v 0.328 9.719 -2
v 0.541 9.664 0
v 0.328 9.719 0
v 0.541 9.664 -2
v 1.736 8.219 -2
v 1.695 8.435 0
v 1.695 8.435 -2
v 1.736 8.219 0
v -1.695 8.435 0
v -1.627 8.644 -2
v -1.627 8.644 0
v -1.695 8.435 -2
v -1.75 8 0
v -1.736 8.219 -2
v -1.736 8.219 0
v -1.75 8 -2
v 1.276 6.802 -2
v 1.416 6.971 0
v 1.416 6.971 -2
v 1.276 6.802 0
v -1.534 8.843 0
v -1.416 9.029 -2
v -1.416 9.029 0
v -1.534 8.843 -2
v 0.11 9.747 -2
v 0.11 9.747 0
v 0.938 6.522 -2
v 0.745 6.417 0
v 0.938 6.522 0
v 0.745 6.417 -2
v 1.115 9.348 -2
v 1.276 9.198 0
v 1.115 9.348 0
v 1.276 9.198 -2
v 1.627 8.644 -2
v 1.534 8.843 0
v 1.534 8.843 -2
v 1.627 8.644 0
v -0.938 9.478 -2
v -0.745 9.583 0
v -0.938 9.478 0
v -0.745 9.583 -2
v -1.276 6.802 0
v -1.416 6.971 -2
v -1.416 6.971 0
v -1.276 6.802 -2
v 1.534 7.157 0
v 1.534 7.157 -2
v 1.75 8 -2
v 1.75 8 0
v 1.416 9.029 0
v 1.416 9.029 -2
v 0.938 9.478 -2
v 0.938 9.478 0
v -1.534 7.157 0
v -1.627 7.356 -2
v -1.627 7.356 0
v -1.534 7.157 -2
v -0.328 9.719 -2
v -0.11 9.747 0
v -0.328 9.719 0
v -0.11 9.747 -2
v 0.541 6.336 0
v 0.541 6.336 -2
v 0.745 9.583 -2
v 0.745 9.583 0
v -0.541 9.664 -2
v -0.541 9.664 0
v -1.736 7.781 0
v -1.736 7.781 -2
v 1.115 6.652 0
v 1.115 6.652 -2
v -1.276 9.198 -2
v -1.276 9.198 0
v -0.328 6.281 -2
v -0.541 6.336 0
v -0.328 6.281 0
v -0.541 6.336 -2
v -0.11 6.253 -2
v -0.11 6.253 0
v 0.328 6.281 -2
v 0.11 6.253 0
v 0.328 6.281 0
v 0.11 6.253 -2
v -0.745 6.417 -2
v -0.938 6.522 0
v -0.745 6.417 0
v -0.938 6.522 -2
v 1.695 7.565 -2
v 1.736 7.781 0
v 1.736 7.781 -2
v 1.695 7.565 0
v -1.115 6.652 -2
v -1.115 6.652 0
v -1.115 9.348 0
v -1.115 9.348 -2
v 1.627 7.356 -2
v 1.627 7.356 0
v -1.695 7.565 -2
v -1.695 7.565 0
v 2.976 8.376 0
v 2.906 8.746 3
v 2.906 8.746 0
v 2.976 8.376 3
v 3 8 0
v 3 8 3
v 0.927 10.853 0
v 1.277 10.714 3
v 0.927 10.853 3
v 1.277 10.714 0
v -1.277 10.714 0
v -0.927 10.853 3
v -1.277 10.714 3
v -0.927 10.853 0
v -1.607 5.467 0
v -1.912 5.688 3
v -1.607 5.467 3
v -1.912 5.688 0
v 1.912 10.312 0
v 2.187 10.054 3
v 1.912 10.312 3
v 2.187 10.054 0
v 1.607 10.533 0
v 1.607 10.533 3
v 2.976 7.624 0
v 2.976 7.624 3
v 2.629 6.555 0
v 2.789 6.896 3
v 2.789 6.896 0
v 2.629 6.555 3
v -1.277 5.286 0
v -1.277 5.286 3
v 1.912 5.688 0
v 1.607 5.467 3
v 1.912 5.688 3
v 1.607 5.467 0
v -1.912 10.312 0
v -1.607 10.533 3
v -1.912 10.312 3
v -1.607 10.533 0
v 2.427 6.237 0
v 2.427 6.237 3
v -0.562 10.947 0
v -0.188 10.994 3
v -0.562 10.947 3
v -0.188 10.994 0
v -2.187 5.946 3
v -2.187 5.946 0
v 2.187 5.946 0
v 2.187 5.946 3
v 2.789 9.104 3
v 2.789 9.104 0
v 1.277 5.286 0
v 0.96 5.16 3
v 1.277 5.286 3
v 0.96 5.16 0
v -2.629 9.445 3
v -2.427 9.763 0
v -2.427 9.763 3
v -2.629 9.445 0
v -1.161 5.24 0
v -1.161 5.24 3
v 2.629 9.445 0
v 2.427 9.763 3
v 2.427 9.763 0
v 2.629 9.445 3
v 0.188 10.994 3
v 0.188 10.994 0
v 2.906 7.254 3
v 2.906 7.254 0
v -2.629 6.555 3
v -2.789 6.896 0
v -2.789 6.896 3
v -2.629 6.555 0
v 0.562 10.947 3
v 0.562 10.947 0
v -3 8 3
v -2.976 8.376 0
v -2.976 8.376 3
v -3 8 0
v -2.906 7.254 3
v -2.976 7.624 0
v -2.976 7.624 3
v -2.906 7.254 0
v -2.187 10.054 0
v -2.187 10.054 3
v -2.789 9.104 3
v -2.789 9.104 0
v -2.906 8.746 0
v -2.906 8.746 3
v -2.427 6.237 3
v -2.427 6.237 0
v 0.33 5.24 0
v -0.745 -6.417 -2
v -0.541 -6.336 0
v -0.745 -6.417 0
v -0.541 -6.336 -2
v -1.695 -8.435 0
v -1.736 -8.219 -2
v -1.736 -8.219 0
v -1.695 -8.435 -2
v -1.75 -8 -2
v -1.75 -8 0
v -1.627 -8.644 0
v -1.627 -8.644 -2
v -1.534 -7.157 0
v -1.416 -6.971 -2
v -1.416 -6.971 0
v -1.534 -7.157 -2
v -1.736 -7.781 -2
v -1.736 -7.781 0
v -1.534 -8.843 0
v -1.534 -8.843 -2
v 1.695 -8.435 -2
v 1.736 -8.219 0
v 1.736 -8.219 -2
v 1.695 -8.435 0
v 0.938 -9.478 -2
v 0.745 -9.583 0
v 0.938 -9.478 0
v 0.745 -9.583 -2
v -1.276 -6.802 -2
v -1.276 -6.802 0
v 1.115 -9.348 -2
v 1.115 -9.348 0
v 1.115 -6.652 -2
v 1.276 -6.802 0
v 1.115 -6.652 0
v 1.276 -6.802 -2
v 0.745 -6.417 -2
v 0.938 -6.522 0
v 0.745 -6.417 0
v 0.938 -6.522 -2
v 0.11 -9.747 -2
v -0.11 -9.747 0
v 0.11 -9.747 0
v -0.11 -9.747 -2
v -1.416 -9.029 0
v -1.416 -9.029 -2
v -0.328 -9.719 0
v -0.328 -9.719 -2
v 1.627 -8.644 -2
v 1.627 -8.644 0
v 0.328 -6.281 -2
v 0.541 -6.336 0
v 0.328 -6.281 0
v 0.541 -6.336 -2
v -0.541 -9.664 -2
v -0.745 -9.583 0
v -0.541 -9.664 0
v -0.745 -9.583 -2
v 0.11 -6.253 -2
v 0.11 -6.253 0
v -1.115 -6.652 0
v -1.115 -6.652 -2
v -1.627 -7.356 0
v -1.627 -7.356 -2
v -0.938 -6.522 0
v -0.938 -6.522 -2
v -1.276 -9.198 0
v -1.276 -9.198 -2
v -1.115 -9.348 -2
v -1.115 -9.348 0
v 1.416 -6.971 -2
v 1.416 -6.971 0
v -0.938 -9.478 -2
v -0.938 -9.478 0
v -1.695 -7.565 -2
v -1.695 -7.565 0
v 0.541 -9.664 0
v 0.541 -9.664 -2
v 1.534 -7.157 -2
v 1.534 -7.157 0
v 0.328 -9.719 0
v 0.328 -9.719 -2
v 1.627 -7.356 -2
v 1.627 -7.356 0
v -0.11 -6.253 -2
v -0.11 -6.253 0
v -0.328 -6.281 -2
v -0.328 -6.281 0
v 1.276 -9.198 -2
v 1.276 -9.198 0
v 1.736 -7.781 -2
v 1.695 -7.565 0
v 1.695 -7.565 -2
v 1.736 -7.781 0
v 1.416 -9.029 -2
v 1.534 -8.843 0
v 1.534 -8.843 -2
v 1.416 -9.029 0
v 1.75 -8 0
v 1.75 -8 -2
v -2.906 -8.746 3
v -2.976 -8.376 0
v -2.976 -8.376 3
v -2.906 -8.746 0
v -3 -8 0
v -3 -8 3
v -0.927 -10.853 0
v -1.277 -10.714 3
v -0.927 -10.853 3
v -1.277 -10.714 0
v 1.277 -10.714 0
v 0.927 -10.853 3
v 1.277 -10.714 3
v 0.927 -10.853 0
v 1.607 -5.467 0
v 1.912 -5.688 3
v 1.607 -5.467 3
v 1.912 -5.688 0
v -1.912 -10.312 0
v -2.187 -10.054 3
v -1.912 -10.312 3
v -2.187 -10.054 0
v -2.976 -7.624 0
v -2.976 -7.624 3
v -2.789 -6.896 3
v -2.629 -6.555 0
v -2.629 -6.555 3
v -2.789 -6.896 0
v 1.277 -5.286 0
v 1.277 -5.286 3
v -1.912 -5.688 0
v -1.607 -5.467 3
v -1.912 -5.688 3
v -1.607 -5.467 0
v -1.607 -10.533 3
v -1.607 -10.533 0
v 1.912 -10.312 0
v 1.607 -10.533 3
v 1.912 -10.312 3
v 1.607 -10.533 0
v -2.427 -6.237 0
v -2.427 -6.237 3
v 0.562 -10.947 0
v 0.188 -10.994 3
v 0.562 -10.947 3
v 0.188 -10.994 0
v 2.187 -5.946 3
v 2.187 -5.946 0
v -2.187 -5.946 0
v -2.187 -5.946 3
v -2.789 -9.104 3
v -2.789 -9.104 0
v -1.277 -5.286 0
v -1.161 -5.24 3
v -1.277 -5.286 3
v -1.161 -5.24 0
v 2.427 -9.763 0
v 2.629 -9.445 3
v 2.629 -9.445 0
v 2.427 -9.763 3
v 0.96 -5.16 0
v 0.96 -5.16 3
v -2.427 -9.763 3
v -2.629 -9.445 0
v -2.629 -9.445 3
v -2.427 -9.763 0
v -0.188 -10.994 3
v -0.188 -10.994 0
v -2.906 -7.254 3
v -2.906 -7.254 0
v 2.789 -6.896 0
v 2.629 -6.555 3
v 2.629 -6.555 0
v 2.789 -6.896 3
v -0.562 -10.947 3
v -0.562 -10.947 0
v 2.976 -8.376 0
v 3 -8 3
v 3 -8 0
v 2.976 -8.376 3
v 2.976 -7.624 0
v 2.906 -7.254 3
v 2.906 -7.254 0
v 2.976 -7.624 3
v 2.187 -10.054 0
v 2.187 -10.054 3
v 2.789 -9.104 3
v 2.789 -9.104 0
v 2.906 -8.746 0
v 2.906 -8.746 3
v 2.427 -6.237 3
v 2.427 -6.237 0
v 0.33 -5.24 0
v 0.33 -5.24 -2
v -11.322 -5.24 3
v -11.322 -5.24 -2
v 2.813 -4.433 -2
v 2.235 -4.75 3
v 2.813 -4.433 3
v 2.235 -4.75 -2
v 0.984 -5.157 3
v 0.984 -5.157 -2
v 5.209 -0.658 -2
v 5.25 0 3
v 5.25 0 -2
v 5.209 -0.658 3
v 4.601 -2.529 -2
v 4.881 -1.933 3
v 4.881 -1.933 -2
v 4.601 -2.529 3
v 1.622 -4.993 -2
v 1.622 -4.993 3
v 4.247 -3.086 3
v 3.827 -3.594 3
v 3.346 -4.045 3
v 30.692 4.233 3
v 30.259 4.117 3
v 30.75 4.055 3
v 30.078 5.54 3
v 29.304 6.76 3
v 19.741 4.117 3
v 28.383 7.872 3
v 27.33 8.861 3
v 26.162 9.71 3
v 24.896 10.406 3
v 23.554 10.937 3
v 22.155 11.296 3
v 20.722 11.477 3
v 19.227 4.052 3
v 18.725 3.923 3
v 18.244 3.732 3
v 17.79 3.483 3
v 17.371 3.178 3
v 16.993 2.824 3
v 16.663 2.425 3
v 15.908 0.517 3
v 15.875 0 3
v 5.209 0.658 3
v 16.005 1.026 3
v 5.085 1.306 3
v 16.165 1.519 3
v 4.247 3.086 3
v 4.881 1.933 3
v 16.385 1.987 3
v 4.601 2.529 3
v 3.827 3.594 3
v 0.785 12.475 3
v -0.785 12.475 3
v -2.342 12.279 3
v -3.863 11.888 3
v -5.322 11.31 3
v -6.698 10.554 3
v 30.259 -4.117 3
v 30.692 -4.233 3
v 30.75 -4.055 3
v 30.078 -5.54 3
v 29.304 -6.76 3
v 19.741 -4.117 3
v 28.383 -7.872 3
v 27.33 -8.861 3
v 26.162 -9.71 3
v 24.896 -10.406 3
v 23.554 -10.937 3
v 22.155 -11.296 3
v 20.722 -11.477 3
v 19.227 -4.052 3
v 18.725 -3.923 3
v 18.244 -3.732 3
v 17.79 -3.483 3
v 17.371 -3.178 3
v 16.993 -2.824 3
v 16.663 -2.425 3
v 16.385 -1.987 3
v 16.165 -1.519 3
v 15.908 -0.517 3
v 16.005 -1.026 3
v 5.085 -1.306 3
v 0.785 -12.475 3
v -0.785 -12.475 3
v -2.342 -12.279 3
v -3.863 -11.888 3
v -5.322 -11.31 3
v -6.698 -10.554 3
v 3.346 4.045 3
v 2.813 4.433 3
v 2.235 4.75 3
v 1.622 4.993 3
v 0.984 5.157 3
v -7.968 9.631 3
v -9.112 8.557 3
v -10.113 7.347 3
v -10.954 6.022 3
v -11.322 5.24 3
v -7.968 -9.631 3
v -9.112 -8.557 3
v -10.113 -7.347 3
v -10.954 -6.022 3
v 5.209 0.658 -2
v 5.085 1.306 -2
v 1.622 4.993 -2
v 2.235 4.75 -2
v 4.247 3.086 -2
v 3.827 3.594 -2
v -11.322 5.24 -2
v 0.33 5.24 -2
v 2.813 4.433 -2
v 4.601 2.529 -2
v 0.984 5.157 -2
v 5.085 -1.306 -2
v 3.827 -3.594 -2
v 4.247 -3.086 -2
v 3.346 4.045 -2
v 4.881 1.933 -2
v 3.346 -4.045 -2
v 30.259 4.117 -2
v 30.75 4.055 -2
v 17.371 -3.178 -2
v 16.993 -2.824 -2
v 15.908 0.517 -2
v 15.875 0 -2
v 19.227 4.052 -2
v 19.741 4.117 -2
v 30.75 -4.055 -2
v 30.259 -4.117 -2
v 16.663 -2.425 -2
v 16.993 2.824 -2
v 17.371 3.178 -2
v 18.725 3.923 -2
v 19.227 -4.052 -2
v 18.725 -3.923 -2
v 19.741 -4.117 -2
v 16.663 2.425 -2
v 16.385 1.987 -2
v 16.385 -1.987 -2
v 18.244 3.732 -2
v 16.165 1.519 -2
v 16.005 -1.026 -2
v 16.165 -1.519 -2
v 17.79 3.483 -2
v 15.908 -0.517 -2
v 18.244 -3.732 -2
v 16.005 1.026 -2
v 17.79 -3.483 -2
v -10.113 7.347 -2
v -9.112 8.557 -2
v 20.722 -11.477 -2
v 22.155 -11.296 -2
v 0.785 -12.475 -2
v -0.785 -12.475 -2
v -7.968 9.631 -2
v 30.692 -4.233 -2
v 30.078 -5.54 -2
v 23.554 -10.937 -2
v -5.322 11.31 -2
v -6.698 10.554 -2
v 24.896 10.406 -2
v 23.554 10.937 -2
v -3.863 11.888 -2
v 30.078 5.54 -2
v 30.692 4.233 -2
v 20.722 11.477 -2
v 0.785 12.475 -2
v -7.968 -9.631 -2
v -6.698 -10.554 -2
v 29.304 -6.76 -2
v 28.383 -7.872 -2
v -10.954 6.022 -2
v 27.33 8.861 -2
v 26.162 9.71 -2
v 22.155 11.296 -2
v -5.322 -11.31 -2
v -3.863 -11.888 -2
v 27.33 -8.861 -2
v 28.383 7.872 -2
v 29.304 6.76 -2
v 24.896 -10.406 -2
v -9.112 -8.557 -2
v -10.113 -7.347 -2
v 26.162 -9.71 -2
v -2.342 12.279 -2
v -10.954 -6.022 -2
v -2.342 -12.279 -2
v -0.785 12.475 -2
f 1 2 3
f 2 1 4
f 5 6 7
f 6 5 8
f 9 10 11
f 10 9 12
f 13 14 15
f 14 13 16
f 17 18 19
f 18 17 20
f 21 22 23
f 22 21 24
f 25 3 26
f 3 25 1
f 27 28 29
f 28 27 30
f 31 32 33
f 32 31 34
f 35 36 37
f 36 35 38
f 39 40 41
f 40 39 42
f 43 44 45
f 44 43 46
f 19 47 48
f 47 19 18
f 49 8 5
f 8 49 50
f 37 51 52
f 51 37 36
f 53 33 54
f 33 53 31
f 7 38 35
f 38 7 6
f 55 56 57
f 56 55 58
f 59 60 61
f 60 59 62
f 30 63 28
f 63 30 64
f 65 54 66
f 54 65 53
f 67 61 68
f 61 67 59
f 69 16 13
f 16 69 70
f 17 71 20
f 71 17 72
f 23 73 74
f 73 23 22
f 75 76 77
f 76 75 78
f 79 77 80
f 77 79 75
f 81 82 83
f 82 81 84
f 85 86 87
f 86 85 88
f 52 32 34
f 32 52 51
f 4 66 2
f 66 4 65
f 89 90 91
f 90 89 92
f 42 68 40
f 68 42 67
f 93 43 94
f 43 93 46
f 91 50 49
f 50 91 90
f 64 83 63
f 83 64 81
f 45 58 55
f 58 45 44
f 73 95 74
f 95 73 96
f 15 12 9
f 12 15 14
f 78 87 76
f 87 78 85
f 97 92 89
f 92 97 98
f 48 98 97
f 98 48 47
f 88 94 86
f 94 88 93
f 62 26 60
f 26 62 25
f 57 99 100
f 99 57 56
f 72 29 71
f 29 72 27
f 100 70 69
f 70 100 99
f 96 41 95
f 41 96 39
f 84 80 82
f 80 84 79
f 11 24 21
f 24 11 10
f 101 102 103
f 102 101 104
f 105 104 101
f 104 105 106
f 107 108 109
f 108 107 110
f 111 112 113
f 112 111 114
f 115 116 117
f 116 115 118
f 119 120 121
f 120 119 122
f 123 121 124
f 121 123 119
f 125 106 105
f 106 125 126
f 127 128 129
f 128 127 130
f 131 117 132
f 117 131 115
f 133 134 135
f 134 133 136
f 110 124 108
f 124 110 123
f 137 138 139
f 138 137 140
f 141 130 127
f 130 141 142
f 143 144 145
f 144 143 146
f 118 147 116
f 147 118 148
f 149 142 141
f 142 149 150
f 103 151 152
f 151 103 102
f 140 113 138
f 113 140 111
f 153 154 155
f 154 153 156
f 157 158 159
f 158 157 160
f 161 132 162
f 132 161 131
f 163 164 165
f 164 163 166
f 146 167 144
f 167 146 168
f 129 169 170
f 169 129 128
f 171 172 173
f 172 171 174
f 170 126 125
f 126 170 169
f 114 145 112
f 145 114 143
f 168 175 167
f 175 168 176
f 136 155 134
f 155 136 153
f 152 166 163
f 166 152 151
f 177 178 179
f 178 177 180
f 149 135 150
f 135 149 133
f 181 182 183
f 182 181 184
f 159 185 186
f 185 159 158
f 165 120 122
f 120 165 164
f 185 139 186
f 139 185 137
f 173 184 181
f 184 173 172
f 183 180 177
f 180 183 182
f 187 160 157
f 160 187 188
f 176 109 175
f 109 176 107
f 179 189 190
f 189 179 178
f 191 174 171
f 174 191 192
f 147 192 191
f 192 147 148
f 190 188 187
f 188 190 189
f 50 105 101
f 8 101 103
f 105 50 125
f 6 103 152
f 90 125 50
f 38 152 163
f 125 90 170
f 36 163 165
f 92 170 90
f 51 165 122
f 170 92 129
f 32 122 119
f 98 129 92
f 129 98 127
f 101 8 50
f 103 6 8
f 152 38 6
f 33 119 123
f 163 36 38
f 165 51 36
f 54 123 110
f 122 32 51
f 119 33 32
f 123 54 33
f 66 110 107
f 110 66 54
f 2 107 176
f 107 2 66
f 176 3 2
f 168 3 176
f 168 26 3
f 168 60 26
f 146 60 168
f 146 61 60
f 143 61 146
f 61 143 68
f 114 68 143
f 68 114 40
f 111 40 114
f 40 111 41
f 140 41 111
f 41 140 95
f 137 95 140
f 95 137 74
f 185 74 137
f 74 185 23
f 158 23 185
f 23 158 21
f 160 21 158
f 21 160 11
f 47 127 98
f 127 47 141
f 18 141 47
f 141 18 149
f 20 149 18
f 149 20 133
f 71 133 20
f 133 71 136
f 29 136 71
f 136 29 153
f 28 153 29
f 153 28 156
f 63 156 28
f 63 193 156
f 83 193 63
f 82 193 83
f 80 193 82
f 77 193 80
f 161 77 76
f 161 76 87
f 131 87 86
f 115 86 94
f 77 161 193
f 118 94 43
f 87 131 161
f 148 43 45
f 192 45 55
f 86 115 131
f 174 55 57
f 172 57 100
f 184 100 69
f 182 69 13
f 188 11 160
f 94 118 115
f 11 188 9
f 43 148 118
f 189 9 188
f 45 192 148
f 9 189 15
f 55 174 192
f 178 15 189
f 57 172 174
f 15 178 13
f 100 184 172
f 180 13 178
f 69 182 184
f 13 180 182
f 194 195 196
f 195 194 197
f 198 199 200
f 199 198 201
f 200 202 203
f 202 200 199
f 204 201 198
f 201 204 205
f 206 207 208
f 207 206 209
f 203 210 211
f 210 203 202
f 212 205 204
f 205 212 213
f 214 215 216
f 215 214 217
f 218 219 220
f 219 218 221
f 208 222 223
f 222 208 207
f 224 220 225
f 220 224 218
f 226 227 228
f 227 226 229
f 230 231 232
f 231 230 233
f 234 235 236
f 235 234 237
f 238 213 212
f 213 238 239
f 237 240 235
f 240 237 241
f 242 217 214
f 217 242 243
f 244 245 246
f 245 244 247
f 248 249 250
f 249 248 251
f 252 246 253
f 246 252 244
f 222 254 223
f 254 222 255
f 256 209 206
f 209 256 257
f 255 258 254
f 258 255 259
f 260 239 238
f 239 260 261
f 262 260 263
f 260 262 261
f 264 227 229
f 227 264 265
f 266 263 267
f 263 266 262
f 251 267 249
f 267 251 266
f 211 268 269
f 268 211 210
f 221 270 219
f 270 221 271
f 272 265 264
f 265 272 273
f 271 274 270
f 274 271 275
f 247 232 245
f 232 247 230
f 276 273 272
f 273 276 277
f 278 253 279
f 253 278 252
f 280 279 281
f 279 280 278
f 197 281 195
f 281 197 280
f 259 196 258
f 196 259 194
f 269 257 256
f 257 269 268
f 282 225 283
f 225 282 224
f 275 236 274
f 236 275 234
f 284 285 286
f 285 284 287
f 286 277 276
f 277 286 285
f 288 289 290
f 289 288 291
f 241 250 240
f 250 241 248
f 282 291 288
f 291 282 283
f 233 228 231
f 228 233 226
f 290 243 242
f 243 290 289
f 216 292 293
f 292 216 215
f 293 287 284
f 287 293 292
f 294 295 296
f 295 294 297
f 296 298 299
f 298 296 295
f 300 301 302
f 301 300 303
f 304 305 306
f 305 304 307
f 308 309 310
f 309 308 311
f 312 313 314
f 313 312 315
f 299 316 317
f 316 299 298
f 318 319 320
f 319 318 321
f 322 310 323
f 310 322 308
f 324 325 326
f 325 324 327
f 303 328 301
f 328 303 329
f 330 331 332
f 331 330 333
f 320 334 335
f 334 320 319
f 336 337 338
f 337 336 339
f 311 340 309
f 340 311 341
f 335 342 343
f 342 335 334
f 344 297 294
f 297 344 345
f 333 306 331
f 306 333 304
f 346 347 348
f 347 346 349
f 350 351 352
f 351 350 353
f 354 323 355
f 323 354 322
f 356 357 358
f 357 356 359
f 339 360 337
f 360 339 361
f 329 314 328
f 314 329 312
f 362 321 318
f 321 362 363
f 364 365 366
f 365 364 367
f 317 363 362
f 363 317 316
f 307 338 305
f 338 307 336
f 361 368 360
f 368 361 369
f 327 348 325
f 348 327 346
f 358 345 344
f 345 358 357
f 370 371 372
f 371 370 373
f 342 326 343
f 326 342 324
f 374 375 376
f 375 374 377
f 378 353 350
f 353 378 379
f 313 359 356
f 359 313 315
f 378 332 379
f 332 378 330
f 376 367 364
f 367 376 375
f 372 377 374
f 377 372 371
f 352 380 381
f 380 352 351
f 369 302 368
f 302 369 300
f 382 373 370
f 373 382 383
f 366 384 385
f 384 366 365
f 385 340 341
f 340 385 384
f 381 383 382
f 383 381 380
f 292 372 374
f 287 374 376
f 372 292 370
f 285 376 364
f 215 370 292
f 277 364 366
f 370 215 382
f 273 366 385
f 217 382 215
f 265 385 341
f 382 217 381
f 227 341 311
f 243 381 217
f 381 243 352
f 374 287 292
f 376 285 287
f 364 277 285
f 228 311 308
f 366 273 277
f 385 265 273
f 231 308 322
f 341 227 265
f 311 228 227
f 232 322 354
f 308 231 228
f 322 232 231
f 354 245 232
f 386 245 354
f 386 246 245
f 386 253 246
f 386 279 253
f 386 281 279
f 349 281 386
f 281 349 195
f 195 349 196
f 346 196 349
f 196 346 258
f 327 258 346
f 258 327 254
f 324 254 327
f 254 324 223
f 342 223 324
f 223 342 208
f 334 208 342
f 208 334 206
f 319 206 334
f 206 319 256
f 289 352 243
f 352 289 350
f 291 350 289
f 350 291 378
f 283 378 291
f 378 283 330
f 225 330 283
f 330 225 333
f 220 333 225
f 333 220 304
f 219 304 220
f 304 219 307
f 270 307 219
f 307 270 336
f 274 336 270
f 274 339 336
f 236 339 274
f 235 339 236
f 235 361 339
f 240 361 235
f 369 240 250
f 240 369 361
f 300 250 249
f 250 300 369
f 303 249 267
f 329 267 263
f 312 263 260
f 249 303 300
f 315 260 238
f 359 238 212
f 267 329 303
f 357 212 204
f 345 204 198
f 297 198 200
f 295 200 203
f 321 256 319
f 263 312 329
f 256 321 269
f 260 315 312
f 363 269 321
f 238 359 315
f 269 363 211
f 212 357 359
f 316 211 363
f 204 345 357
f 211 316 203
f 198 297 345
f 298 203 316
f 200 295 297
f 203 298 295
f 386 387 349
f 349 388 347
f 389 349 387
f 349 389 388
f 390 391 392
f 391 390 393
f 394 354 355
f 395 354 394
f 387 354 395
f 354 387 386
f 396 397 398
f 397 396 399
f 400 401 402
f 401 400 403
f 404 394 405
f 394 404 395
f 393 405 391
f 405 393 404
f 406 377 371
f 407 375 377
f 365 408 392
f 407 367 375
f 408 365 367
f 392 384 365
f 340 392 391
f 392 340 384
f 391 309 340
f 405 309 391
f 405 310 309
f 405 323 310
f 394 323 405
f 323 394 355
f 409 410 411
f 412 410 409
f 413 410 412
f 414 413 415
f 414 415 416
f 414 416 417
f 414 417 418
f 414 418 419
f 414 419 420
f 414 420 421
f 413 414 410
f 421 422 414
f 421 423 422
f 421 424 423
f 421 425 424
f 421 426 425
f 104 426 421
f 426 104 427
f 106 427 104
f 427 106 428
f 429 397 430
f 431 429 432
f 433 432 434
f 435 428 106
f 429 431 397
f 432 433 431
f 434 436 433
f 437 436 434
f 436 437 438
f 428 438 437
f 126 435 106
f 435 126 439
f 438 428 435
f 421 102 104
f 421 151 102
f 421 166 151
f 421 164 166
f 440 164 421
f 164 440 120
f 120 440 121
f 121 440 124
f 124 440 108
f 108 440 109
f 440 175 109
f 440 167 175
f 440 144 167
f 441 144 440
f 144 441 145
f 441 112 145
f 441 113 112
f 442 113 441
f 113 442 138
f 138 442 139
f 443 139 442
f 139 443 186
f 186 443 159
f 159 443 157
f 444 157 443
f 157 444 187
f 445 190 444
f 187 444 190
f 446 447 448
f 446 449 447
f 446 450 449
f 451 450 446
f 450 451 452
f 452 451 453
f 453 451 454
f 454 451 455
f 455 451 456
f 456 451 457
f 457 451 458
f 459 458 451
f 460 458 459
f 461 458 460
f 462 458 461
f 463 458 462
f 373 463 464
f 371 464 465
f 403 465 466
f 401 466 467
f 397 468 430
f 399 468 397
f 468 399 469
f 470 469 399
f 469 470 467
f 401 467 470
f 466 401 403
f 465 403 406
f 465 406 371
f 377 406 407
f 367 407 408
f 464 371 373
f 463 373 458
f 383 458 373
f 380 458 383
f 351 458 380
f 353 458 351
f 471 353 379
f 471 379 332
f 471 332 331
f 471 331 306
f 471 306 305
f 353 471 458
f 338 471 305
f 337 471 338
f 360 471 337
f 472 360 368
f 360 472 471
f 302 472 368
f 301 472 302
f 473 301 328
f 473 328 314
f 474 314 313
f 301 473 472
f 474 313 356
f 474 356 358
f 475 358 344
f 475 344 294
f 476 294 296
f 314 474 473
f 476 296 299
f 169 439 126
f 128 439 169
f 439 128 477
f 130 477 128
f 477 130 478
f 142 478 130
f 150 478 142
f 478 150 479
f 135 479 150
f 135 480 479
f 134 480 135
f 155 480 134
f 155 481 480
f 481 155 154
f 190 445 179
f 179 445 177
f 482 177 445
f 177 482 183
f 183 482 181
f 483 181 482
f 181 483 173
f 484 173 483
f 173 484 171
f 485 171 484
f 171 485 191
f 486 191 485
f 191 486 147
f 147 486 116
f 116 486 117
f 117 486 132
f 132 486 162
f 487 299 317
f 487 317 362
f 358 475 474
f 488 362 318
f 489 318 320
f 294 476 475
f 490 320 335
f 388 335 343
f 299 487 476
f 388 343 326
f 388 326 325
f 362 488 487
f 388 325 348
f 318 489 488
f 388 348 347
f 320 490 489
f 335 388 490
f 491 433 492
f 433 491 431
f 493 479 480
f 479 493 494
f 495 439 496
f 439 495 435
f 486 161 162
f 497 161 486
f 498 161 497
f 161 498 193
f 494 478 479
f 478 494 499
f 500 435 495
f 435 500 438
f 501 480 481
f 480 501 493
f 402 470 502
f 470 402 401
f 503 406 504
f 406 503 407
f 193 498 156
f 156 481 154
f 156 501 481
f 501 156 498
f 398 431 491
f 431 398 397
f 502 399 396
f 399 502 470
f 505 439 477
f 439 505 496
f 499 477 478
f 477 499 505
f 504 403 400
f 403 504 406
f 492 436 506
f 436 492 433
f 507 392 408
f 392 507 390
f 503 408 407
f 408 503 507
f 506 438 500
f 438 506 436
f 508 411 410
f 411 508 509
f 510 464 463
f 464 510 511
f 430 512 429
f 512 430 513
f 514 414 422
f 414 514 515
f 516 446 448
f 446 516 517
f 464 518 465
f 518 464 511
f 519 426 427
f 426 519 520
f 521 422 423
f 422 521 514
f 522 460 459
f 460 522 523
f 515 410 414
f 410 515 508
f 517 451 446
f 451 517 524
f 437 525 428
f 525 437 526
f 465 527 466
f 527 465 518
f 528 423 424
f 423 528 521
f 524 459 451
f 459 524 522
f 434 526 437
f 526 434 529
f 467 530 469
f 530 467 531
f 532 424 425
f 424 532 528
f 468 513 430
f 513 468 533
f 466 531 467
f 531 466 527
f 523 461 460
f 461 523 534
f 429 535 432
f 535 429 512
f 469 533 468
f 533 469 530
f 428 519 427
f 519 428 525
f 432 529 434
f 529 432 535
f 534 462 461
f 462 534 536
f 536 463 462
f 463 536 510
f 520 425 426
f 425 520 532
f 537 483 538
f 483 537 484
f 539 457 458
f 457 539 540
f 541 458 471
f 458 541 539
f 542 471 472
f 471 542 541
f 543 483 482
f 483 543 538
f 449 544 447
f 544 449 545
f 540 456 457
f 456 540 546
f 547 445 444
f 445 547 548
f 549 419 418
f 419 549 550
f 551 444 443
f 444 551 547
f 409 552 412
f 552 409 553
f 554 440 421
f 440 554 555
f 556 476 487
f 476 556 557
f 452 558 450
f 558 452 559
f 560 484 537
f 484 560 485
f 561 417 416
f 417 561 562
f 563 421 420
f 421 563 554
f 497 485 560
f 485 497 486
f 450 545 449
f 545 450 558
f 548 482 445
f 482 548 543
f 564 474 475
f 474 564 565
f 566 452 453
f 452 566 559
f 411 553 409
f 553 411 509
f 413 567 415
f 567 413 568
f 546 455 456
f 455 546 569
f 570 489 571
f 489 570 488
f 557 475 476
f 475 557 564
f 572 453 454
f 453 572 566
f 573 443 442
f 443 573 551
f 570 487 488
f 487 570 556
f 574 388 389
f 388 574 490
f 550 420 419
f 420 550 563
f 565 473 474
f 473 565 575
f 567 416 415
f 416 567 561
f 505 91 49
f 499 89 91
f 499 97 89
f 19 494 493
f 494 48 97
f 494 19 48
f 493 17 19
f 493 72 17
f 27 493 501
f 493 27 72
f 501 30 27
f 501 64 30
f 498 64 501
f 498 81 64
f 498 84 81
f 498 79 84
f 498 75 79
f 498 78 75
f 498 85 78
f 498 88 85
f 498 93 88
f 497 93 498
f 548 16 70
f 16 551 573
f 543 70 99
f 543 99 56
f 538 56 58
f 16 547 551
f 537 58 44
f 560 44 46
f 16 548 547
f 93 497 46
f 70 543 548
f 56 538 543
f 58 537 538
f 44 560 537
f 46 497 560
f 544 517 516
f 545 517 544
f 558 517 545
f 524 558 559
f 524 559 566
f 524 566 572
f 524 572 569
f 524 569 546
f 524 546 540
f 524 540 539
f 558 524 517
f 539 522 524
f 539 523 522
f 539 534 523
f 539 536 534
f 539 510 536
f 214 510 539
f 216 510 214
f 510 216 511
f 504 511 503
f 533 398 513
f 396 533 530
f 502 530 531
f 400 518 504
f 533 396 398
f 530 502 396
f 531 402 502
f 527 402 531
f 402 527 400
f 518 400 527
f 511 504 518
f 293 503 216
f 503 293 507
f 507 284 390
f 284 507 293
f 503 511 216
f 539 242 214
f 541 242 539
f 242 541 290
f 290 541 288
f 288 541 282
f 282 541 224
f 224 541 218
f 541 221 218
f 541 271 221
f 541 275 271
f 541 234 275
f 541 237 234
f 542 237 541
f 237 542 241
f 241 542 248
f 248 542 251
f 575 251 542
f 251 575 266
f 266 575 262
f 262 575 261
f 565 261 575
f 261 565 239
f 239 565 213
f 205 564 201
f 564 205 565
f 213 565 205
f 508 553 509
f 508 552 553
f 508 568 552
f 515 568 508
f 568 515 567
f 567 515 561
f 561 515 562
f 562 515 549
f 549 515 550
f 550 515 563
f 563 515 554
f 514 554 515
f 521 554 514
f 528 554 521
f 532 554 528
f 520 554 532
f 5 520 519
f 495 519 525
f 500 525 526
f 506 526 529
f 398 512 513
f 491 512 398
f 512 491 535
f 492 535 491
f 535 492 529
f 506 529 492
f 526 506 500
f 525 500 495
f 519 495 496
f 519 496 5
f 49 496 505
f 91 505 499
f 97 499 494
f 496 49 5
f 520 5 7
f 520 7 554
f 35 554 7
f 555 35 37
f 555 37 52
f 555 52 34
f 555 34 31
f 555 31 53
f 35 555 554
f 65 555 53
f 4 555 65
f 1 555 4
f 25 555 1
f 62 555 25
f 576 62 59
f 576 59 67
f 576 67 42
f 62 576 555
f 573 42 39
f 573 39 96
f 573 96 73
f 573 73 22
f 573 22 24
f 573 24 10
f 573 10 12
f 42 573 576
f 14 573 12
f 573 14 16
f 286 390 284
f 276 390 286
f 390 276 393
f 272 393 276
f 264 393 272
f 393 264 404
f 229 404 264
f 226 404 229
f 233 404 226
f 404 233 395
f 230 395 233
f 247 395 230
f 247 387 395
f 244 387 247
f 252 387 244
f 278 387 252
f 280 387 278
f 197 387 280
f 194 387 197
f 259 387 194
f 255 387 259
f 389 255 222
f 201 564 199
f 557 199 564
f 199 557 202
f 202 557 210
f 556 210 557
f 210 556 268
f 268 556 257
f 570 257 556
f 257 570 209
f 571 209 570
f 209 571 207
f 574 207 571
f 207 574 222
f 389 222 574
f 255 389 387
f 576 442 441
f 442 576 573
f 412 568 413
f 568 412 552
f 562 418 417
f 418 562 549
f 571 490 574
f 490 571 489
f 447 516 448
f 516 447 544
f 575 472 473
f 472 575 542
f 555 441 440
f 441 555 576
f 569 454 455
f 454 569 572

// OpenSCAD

screw_len=6; //total threaded length
minus=4;
$fn=50;

//color([0.6,0.2,0.3])import("anti-z-wobbling.stl");

difference(){
hull()
{
cylinder(d=25,3);
translate([20,0,0])cylinder(d=23,3);
translate([0,0,-screw_len+minus])cylinder(d=25,screw_len-minus);
translate([20,0,-screw_len+minus])cylinder(d=23,screw_len-minus);
}

for(i=[0:1]){
rotate(i*-360/2){translate([0,8,-screw_len-1])cylinder(d=3.5,screw_len+5);
translate([0,8,0])cylinder(d=6,4);
   }
   }

translate([0,0,-screw_len-3]){
hull(){
cylinder(d=10.5,screw_len*2);
translate([-13,0,0])cylinder(d=10.5,screw_len*2);
}
hull(){
translate([20,0,0])cylinder(d=8.25,screw_len*2);
translate([30,0,0])cylinder(d=8.25,screw_len*2);
}
}
}
